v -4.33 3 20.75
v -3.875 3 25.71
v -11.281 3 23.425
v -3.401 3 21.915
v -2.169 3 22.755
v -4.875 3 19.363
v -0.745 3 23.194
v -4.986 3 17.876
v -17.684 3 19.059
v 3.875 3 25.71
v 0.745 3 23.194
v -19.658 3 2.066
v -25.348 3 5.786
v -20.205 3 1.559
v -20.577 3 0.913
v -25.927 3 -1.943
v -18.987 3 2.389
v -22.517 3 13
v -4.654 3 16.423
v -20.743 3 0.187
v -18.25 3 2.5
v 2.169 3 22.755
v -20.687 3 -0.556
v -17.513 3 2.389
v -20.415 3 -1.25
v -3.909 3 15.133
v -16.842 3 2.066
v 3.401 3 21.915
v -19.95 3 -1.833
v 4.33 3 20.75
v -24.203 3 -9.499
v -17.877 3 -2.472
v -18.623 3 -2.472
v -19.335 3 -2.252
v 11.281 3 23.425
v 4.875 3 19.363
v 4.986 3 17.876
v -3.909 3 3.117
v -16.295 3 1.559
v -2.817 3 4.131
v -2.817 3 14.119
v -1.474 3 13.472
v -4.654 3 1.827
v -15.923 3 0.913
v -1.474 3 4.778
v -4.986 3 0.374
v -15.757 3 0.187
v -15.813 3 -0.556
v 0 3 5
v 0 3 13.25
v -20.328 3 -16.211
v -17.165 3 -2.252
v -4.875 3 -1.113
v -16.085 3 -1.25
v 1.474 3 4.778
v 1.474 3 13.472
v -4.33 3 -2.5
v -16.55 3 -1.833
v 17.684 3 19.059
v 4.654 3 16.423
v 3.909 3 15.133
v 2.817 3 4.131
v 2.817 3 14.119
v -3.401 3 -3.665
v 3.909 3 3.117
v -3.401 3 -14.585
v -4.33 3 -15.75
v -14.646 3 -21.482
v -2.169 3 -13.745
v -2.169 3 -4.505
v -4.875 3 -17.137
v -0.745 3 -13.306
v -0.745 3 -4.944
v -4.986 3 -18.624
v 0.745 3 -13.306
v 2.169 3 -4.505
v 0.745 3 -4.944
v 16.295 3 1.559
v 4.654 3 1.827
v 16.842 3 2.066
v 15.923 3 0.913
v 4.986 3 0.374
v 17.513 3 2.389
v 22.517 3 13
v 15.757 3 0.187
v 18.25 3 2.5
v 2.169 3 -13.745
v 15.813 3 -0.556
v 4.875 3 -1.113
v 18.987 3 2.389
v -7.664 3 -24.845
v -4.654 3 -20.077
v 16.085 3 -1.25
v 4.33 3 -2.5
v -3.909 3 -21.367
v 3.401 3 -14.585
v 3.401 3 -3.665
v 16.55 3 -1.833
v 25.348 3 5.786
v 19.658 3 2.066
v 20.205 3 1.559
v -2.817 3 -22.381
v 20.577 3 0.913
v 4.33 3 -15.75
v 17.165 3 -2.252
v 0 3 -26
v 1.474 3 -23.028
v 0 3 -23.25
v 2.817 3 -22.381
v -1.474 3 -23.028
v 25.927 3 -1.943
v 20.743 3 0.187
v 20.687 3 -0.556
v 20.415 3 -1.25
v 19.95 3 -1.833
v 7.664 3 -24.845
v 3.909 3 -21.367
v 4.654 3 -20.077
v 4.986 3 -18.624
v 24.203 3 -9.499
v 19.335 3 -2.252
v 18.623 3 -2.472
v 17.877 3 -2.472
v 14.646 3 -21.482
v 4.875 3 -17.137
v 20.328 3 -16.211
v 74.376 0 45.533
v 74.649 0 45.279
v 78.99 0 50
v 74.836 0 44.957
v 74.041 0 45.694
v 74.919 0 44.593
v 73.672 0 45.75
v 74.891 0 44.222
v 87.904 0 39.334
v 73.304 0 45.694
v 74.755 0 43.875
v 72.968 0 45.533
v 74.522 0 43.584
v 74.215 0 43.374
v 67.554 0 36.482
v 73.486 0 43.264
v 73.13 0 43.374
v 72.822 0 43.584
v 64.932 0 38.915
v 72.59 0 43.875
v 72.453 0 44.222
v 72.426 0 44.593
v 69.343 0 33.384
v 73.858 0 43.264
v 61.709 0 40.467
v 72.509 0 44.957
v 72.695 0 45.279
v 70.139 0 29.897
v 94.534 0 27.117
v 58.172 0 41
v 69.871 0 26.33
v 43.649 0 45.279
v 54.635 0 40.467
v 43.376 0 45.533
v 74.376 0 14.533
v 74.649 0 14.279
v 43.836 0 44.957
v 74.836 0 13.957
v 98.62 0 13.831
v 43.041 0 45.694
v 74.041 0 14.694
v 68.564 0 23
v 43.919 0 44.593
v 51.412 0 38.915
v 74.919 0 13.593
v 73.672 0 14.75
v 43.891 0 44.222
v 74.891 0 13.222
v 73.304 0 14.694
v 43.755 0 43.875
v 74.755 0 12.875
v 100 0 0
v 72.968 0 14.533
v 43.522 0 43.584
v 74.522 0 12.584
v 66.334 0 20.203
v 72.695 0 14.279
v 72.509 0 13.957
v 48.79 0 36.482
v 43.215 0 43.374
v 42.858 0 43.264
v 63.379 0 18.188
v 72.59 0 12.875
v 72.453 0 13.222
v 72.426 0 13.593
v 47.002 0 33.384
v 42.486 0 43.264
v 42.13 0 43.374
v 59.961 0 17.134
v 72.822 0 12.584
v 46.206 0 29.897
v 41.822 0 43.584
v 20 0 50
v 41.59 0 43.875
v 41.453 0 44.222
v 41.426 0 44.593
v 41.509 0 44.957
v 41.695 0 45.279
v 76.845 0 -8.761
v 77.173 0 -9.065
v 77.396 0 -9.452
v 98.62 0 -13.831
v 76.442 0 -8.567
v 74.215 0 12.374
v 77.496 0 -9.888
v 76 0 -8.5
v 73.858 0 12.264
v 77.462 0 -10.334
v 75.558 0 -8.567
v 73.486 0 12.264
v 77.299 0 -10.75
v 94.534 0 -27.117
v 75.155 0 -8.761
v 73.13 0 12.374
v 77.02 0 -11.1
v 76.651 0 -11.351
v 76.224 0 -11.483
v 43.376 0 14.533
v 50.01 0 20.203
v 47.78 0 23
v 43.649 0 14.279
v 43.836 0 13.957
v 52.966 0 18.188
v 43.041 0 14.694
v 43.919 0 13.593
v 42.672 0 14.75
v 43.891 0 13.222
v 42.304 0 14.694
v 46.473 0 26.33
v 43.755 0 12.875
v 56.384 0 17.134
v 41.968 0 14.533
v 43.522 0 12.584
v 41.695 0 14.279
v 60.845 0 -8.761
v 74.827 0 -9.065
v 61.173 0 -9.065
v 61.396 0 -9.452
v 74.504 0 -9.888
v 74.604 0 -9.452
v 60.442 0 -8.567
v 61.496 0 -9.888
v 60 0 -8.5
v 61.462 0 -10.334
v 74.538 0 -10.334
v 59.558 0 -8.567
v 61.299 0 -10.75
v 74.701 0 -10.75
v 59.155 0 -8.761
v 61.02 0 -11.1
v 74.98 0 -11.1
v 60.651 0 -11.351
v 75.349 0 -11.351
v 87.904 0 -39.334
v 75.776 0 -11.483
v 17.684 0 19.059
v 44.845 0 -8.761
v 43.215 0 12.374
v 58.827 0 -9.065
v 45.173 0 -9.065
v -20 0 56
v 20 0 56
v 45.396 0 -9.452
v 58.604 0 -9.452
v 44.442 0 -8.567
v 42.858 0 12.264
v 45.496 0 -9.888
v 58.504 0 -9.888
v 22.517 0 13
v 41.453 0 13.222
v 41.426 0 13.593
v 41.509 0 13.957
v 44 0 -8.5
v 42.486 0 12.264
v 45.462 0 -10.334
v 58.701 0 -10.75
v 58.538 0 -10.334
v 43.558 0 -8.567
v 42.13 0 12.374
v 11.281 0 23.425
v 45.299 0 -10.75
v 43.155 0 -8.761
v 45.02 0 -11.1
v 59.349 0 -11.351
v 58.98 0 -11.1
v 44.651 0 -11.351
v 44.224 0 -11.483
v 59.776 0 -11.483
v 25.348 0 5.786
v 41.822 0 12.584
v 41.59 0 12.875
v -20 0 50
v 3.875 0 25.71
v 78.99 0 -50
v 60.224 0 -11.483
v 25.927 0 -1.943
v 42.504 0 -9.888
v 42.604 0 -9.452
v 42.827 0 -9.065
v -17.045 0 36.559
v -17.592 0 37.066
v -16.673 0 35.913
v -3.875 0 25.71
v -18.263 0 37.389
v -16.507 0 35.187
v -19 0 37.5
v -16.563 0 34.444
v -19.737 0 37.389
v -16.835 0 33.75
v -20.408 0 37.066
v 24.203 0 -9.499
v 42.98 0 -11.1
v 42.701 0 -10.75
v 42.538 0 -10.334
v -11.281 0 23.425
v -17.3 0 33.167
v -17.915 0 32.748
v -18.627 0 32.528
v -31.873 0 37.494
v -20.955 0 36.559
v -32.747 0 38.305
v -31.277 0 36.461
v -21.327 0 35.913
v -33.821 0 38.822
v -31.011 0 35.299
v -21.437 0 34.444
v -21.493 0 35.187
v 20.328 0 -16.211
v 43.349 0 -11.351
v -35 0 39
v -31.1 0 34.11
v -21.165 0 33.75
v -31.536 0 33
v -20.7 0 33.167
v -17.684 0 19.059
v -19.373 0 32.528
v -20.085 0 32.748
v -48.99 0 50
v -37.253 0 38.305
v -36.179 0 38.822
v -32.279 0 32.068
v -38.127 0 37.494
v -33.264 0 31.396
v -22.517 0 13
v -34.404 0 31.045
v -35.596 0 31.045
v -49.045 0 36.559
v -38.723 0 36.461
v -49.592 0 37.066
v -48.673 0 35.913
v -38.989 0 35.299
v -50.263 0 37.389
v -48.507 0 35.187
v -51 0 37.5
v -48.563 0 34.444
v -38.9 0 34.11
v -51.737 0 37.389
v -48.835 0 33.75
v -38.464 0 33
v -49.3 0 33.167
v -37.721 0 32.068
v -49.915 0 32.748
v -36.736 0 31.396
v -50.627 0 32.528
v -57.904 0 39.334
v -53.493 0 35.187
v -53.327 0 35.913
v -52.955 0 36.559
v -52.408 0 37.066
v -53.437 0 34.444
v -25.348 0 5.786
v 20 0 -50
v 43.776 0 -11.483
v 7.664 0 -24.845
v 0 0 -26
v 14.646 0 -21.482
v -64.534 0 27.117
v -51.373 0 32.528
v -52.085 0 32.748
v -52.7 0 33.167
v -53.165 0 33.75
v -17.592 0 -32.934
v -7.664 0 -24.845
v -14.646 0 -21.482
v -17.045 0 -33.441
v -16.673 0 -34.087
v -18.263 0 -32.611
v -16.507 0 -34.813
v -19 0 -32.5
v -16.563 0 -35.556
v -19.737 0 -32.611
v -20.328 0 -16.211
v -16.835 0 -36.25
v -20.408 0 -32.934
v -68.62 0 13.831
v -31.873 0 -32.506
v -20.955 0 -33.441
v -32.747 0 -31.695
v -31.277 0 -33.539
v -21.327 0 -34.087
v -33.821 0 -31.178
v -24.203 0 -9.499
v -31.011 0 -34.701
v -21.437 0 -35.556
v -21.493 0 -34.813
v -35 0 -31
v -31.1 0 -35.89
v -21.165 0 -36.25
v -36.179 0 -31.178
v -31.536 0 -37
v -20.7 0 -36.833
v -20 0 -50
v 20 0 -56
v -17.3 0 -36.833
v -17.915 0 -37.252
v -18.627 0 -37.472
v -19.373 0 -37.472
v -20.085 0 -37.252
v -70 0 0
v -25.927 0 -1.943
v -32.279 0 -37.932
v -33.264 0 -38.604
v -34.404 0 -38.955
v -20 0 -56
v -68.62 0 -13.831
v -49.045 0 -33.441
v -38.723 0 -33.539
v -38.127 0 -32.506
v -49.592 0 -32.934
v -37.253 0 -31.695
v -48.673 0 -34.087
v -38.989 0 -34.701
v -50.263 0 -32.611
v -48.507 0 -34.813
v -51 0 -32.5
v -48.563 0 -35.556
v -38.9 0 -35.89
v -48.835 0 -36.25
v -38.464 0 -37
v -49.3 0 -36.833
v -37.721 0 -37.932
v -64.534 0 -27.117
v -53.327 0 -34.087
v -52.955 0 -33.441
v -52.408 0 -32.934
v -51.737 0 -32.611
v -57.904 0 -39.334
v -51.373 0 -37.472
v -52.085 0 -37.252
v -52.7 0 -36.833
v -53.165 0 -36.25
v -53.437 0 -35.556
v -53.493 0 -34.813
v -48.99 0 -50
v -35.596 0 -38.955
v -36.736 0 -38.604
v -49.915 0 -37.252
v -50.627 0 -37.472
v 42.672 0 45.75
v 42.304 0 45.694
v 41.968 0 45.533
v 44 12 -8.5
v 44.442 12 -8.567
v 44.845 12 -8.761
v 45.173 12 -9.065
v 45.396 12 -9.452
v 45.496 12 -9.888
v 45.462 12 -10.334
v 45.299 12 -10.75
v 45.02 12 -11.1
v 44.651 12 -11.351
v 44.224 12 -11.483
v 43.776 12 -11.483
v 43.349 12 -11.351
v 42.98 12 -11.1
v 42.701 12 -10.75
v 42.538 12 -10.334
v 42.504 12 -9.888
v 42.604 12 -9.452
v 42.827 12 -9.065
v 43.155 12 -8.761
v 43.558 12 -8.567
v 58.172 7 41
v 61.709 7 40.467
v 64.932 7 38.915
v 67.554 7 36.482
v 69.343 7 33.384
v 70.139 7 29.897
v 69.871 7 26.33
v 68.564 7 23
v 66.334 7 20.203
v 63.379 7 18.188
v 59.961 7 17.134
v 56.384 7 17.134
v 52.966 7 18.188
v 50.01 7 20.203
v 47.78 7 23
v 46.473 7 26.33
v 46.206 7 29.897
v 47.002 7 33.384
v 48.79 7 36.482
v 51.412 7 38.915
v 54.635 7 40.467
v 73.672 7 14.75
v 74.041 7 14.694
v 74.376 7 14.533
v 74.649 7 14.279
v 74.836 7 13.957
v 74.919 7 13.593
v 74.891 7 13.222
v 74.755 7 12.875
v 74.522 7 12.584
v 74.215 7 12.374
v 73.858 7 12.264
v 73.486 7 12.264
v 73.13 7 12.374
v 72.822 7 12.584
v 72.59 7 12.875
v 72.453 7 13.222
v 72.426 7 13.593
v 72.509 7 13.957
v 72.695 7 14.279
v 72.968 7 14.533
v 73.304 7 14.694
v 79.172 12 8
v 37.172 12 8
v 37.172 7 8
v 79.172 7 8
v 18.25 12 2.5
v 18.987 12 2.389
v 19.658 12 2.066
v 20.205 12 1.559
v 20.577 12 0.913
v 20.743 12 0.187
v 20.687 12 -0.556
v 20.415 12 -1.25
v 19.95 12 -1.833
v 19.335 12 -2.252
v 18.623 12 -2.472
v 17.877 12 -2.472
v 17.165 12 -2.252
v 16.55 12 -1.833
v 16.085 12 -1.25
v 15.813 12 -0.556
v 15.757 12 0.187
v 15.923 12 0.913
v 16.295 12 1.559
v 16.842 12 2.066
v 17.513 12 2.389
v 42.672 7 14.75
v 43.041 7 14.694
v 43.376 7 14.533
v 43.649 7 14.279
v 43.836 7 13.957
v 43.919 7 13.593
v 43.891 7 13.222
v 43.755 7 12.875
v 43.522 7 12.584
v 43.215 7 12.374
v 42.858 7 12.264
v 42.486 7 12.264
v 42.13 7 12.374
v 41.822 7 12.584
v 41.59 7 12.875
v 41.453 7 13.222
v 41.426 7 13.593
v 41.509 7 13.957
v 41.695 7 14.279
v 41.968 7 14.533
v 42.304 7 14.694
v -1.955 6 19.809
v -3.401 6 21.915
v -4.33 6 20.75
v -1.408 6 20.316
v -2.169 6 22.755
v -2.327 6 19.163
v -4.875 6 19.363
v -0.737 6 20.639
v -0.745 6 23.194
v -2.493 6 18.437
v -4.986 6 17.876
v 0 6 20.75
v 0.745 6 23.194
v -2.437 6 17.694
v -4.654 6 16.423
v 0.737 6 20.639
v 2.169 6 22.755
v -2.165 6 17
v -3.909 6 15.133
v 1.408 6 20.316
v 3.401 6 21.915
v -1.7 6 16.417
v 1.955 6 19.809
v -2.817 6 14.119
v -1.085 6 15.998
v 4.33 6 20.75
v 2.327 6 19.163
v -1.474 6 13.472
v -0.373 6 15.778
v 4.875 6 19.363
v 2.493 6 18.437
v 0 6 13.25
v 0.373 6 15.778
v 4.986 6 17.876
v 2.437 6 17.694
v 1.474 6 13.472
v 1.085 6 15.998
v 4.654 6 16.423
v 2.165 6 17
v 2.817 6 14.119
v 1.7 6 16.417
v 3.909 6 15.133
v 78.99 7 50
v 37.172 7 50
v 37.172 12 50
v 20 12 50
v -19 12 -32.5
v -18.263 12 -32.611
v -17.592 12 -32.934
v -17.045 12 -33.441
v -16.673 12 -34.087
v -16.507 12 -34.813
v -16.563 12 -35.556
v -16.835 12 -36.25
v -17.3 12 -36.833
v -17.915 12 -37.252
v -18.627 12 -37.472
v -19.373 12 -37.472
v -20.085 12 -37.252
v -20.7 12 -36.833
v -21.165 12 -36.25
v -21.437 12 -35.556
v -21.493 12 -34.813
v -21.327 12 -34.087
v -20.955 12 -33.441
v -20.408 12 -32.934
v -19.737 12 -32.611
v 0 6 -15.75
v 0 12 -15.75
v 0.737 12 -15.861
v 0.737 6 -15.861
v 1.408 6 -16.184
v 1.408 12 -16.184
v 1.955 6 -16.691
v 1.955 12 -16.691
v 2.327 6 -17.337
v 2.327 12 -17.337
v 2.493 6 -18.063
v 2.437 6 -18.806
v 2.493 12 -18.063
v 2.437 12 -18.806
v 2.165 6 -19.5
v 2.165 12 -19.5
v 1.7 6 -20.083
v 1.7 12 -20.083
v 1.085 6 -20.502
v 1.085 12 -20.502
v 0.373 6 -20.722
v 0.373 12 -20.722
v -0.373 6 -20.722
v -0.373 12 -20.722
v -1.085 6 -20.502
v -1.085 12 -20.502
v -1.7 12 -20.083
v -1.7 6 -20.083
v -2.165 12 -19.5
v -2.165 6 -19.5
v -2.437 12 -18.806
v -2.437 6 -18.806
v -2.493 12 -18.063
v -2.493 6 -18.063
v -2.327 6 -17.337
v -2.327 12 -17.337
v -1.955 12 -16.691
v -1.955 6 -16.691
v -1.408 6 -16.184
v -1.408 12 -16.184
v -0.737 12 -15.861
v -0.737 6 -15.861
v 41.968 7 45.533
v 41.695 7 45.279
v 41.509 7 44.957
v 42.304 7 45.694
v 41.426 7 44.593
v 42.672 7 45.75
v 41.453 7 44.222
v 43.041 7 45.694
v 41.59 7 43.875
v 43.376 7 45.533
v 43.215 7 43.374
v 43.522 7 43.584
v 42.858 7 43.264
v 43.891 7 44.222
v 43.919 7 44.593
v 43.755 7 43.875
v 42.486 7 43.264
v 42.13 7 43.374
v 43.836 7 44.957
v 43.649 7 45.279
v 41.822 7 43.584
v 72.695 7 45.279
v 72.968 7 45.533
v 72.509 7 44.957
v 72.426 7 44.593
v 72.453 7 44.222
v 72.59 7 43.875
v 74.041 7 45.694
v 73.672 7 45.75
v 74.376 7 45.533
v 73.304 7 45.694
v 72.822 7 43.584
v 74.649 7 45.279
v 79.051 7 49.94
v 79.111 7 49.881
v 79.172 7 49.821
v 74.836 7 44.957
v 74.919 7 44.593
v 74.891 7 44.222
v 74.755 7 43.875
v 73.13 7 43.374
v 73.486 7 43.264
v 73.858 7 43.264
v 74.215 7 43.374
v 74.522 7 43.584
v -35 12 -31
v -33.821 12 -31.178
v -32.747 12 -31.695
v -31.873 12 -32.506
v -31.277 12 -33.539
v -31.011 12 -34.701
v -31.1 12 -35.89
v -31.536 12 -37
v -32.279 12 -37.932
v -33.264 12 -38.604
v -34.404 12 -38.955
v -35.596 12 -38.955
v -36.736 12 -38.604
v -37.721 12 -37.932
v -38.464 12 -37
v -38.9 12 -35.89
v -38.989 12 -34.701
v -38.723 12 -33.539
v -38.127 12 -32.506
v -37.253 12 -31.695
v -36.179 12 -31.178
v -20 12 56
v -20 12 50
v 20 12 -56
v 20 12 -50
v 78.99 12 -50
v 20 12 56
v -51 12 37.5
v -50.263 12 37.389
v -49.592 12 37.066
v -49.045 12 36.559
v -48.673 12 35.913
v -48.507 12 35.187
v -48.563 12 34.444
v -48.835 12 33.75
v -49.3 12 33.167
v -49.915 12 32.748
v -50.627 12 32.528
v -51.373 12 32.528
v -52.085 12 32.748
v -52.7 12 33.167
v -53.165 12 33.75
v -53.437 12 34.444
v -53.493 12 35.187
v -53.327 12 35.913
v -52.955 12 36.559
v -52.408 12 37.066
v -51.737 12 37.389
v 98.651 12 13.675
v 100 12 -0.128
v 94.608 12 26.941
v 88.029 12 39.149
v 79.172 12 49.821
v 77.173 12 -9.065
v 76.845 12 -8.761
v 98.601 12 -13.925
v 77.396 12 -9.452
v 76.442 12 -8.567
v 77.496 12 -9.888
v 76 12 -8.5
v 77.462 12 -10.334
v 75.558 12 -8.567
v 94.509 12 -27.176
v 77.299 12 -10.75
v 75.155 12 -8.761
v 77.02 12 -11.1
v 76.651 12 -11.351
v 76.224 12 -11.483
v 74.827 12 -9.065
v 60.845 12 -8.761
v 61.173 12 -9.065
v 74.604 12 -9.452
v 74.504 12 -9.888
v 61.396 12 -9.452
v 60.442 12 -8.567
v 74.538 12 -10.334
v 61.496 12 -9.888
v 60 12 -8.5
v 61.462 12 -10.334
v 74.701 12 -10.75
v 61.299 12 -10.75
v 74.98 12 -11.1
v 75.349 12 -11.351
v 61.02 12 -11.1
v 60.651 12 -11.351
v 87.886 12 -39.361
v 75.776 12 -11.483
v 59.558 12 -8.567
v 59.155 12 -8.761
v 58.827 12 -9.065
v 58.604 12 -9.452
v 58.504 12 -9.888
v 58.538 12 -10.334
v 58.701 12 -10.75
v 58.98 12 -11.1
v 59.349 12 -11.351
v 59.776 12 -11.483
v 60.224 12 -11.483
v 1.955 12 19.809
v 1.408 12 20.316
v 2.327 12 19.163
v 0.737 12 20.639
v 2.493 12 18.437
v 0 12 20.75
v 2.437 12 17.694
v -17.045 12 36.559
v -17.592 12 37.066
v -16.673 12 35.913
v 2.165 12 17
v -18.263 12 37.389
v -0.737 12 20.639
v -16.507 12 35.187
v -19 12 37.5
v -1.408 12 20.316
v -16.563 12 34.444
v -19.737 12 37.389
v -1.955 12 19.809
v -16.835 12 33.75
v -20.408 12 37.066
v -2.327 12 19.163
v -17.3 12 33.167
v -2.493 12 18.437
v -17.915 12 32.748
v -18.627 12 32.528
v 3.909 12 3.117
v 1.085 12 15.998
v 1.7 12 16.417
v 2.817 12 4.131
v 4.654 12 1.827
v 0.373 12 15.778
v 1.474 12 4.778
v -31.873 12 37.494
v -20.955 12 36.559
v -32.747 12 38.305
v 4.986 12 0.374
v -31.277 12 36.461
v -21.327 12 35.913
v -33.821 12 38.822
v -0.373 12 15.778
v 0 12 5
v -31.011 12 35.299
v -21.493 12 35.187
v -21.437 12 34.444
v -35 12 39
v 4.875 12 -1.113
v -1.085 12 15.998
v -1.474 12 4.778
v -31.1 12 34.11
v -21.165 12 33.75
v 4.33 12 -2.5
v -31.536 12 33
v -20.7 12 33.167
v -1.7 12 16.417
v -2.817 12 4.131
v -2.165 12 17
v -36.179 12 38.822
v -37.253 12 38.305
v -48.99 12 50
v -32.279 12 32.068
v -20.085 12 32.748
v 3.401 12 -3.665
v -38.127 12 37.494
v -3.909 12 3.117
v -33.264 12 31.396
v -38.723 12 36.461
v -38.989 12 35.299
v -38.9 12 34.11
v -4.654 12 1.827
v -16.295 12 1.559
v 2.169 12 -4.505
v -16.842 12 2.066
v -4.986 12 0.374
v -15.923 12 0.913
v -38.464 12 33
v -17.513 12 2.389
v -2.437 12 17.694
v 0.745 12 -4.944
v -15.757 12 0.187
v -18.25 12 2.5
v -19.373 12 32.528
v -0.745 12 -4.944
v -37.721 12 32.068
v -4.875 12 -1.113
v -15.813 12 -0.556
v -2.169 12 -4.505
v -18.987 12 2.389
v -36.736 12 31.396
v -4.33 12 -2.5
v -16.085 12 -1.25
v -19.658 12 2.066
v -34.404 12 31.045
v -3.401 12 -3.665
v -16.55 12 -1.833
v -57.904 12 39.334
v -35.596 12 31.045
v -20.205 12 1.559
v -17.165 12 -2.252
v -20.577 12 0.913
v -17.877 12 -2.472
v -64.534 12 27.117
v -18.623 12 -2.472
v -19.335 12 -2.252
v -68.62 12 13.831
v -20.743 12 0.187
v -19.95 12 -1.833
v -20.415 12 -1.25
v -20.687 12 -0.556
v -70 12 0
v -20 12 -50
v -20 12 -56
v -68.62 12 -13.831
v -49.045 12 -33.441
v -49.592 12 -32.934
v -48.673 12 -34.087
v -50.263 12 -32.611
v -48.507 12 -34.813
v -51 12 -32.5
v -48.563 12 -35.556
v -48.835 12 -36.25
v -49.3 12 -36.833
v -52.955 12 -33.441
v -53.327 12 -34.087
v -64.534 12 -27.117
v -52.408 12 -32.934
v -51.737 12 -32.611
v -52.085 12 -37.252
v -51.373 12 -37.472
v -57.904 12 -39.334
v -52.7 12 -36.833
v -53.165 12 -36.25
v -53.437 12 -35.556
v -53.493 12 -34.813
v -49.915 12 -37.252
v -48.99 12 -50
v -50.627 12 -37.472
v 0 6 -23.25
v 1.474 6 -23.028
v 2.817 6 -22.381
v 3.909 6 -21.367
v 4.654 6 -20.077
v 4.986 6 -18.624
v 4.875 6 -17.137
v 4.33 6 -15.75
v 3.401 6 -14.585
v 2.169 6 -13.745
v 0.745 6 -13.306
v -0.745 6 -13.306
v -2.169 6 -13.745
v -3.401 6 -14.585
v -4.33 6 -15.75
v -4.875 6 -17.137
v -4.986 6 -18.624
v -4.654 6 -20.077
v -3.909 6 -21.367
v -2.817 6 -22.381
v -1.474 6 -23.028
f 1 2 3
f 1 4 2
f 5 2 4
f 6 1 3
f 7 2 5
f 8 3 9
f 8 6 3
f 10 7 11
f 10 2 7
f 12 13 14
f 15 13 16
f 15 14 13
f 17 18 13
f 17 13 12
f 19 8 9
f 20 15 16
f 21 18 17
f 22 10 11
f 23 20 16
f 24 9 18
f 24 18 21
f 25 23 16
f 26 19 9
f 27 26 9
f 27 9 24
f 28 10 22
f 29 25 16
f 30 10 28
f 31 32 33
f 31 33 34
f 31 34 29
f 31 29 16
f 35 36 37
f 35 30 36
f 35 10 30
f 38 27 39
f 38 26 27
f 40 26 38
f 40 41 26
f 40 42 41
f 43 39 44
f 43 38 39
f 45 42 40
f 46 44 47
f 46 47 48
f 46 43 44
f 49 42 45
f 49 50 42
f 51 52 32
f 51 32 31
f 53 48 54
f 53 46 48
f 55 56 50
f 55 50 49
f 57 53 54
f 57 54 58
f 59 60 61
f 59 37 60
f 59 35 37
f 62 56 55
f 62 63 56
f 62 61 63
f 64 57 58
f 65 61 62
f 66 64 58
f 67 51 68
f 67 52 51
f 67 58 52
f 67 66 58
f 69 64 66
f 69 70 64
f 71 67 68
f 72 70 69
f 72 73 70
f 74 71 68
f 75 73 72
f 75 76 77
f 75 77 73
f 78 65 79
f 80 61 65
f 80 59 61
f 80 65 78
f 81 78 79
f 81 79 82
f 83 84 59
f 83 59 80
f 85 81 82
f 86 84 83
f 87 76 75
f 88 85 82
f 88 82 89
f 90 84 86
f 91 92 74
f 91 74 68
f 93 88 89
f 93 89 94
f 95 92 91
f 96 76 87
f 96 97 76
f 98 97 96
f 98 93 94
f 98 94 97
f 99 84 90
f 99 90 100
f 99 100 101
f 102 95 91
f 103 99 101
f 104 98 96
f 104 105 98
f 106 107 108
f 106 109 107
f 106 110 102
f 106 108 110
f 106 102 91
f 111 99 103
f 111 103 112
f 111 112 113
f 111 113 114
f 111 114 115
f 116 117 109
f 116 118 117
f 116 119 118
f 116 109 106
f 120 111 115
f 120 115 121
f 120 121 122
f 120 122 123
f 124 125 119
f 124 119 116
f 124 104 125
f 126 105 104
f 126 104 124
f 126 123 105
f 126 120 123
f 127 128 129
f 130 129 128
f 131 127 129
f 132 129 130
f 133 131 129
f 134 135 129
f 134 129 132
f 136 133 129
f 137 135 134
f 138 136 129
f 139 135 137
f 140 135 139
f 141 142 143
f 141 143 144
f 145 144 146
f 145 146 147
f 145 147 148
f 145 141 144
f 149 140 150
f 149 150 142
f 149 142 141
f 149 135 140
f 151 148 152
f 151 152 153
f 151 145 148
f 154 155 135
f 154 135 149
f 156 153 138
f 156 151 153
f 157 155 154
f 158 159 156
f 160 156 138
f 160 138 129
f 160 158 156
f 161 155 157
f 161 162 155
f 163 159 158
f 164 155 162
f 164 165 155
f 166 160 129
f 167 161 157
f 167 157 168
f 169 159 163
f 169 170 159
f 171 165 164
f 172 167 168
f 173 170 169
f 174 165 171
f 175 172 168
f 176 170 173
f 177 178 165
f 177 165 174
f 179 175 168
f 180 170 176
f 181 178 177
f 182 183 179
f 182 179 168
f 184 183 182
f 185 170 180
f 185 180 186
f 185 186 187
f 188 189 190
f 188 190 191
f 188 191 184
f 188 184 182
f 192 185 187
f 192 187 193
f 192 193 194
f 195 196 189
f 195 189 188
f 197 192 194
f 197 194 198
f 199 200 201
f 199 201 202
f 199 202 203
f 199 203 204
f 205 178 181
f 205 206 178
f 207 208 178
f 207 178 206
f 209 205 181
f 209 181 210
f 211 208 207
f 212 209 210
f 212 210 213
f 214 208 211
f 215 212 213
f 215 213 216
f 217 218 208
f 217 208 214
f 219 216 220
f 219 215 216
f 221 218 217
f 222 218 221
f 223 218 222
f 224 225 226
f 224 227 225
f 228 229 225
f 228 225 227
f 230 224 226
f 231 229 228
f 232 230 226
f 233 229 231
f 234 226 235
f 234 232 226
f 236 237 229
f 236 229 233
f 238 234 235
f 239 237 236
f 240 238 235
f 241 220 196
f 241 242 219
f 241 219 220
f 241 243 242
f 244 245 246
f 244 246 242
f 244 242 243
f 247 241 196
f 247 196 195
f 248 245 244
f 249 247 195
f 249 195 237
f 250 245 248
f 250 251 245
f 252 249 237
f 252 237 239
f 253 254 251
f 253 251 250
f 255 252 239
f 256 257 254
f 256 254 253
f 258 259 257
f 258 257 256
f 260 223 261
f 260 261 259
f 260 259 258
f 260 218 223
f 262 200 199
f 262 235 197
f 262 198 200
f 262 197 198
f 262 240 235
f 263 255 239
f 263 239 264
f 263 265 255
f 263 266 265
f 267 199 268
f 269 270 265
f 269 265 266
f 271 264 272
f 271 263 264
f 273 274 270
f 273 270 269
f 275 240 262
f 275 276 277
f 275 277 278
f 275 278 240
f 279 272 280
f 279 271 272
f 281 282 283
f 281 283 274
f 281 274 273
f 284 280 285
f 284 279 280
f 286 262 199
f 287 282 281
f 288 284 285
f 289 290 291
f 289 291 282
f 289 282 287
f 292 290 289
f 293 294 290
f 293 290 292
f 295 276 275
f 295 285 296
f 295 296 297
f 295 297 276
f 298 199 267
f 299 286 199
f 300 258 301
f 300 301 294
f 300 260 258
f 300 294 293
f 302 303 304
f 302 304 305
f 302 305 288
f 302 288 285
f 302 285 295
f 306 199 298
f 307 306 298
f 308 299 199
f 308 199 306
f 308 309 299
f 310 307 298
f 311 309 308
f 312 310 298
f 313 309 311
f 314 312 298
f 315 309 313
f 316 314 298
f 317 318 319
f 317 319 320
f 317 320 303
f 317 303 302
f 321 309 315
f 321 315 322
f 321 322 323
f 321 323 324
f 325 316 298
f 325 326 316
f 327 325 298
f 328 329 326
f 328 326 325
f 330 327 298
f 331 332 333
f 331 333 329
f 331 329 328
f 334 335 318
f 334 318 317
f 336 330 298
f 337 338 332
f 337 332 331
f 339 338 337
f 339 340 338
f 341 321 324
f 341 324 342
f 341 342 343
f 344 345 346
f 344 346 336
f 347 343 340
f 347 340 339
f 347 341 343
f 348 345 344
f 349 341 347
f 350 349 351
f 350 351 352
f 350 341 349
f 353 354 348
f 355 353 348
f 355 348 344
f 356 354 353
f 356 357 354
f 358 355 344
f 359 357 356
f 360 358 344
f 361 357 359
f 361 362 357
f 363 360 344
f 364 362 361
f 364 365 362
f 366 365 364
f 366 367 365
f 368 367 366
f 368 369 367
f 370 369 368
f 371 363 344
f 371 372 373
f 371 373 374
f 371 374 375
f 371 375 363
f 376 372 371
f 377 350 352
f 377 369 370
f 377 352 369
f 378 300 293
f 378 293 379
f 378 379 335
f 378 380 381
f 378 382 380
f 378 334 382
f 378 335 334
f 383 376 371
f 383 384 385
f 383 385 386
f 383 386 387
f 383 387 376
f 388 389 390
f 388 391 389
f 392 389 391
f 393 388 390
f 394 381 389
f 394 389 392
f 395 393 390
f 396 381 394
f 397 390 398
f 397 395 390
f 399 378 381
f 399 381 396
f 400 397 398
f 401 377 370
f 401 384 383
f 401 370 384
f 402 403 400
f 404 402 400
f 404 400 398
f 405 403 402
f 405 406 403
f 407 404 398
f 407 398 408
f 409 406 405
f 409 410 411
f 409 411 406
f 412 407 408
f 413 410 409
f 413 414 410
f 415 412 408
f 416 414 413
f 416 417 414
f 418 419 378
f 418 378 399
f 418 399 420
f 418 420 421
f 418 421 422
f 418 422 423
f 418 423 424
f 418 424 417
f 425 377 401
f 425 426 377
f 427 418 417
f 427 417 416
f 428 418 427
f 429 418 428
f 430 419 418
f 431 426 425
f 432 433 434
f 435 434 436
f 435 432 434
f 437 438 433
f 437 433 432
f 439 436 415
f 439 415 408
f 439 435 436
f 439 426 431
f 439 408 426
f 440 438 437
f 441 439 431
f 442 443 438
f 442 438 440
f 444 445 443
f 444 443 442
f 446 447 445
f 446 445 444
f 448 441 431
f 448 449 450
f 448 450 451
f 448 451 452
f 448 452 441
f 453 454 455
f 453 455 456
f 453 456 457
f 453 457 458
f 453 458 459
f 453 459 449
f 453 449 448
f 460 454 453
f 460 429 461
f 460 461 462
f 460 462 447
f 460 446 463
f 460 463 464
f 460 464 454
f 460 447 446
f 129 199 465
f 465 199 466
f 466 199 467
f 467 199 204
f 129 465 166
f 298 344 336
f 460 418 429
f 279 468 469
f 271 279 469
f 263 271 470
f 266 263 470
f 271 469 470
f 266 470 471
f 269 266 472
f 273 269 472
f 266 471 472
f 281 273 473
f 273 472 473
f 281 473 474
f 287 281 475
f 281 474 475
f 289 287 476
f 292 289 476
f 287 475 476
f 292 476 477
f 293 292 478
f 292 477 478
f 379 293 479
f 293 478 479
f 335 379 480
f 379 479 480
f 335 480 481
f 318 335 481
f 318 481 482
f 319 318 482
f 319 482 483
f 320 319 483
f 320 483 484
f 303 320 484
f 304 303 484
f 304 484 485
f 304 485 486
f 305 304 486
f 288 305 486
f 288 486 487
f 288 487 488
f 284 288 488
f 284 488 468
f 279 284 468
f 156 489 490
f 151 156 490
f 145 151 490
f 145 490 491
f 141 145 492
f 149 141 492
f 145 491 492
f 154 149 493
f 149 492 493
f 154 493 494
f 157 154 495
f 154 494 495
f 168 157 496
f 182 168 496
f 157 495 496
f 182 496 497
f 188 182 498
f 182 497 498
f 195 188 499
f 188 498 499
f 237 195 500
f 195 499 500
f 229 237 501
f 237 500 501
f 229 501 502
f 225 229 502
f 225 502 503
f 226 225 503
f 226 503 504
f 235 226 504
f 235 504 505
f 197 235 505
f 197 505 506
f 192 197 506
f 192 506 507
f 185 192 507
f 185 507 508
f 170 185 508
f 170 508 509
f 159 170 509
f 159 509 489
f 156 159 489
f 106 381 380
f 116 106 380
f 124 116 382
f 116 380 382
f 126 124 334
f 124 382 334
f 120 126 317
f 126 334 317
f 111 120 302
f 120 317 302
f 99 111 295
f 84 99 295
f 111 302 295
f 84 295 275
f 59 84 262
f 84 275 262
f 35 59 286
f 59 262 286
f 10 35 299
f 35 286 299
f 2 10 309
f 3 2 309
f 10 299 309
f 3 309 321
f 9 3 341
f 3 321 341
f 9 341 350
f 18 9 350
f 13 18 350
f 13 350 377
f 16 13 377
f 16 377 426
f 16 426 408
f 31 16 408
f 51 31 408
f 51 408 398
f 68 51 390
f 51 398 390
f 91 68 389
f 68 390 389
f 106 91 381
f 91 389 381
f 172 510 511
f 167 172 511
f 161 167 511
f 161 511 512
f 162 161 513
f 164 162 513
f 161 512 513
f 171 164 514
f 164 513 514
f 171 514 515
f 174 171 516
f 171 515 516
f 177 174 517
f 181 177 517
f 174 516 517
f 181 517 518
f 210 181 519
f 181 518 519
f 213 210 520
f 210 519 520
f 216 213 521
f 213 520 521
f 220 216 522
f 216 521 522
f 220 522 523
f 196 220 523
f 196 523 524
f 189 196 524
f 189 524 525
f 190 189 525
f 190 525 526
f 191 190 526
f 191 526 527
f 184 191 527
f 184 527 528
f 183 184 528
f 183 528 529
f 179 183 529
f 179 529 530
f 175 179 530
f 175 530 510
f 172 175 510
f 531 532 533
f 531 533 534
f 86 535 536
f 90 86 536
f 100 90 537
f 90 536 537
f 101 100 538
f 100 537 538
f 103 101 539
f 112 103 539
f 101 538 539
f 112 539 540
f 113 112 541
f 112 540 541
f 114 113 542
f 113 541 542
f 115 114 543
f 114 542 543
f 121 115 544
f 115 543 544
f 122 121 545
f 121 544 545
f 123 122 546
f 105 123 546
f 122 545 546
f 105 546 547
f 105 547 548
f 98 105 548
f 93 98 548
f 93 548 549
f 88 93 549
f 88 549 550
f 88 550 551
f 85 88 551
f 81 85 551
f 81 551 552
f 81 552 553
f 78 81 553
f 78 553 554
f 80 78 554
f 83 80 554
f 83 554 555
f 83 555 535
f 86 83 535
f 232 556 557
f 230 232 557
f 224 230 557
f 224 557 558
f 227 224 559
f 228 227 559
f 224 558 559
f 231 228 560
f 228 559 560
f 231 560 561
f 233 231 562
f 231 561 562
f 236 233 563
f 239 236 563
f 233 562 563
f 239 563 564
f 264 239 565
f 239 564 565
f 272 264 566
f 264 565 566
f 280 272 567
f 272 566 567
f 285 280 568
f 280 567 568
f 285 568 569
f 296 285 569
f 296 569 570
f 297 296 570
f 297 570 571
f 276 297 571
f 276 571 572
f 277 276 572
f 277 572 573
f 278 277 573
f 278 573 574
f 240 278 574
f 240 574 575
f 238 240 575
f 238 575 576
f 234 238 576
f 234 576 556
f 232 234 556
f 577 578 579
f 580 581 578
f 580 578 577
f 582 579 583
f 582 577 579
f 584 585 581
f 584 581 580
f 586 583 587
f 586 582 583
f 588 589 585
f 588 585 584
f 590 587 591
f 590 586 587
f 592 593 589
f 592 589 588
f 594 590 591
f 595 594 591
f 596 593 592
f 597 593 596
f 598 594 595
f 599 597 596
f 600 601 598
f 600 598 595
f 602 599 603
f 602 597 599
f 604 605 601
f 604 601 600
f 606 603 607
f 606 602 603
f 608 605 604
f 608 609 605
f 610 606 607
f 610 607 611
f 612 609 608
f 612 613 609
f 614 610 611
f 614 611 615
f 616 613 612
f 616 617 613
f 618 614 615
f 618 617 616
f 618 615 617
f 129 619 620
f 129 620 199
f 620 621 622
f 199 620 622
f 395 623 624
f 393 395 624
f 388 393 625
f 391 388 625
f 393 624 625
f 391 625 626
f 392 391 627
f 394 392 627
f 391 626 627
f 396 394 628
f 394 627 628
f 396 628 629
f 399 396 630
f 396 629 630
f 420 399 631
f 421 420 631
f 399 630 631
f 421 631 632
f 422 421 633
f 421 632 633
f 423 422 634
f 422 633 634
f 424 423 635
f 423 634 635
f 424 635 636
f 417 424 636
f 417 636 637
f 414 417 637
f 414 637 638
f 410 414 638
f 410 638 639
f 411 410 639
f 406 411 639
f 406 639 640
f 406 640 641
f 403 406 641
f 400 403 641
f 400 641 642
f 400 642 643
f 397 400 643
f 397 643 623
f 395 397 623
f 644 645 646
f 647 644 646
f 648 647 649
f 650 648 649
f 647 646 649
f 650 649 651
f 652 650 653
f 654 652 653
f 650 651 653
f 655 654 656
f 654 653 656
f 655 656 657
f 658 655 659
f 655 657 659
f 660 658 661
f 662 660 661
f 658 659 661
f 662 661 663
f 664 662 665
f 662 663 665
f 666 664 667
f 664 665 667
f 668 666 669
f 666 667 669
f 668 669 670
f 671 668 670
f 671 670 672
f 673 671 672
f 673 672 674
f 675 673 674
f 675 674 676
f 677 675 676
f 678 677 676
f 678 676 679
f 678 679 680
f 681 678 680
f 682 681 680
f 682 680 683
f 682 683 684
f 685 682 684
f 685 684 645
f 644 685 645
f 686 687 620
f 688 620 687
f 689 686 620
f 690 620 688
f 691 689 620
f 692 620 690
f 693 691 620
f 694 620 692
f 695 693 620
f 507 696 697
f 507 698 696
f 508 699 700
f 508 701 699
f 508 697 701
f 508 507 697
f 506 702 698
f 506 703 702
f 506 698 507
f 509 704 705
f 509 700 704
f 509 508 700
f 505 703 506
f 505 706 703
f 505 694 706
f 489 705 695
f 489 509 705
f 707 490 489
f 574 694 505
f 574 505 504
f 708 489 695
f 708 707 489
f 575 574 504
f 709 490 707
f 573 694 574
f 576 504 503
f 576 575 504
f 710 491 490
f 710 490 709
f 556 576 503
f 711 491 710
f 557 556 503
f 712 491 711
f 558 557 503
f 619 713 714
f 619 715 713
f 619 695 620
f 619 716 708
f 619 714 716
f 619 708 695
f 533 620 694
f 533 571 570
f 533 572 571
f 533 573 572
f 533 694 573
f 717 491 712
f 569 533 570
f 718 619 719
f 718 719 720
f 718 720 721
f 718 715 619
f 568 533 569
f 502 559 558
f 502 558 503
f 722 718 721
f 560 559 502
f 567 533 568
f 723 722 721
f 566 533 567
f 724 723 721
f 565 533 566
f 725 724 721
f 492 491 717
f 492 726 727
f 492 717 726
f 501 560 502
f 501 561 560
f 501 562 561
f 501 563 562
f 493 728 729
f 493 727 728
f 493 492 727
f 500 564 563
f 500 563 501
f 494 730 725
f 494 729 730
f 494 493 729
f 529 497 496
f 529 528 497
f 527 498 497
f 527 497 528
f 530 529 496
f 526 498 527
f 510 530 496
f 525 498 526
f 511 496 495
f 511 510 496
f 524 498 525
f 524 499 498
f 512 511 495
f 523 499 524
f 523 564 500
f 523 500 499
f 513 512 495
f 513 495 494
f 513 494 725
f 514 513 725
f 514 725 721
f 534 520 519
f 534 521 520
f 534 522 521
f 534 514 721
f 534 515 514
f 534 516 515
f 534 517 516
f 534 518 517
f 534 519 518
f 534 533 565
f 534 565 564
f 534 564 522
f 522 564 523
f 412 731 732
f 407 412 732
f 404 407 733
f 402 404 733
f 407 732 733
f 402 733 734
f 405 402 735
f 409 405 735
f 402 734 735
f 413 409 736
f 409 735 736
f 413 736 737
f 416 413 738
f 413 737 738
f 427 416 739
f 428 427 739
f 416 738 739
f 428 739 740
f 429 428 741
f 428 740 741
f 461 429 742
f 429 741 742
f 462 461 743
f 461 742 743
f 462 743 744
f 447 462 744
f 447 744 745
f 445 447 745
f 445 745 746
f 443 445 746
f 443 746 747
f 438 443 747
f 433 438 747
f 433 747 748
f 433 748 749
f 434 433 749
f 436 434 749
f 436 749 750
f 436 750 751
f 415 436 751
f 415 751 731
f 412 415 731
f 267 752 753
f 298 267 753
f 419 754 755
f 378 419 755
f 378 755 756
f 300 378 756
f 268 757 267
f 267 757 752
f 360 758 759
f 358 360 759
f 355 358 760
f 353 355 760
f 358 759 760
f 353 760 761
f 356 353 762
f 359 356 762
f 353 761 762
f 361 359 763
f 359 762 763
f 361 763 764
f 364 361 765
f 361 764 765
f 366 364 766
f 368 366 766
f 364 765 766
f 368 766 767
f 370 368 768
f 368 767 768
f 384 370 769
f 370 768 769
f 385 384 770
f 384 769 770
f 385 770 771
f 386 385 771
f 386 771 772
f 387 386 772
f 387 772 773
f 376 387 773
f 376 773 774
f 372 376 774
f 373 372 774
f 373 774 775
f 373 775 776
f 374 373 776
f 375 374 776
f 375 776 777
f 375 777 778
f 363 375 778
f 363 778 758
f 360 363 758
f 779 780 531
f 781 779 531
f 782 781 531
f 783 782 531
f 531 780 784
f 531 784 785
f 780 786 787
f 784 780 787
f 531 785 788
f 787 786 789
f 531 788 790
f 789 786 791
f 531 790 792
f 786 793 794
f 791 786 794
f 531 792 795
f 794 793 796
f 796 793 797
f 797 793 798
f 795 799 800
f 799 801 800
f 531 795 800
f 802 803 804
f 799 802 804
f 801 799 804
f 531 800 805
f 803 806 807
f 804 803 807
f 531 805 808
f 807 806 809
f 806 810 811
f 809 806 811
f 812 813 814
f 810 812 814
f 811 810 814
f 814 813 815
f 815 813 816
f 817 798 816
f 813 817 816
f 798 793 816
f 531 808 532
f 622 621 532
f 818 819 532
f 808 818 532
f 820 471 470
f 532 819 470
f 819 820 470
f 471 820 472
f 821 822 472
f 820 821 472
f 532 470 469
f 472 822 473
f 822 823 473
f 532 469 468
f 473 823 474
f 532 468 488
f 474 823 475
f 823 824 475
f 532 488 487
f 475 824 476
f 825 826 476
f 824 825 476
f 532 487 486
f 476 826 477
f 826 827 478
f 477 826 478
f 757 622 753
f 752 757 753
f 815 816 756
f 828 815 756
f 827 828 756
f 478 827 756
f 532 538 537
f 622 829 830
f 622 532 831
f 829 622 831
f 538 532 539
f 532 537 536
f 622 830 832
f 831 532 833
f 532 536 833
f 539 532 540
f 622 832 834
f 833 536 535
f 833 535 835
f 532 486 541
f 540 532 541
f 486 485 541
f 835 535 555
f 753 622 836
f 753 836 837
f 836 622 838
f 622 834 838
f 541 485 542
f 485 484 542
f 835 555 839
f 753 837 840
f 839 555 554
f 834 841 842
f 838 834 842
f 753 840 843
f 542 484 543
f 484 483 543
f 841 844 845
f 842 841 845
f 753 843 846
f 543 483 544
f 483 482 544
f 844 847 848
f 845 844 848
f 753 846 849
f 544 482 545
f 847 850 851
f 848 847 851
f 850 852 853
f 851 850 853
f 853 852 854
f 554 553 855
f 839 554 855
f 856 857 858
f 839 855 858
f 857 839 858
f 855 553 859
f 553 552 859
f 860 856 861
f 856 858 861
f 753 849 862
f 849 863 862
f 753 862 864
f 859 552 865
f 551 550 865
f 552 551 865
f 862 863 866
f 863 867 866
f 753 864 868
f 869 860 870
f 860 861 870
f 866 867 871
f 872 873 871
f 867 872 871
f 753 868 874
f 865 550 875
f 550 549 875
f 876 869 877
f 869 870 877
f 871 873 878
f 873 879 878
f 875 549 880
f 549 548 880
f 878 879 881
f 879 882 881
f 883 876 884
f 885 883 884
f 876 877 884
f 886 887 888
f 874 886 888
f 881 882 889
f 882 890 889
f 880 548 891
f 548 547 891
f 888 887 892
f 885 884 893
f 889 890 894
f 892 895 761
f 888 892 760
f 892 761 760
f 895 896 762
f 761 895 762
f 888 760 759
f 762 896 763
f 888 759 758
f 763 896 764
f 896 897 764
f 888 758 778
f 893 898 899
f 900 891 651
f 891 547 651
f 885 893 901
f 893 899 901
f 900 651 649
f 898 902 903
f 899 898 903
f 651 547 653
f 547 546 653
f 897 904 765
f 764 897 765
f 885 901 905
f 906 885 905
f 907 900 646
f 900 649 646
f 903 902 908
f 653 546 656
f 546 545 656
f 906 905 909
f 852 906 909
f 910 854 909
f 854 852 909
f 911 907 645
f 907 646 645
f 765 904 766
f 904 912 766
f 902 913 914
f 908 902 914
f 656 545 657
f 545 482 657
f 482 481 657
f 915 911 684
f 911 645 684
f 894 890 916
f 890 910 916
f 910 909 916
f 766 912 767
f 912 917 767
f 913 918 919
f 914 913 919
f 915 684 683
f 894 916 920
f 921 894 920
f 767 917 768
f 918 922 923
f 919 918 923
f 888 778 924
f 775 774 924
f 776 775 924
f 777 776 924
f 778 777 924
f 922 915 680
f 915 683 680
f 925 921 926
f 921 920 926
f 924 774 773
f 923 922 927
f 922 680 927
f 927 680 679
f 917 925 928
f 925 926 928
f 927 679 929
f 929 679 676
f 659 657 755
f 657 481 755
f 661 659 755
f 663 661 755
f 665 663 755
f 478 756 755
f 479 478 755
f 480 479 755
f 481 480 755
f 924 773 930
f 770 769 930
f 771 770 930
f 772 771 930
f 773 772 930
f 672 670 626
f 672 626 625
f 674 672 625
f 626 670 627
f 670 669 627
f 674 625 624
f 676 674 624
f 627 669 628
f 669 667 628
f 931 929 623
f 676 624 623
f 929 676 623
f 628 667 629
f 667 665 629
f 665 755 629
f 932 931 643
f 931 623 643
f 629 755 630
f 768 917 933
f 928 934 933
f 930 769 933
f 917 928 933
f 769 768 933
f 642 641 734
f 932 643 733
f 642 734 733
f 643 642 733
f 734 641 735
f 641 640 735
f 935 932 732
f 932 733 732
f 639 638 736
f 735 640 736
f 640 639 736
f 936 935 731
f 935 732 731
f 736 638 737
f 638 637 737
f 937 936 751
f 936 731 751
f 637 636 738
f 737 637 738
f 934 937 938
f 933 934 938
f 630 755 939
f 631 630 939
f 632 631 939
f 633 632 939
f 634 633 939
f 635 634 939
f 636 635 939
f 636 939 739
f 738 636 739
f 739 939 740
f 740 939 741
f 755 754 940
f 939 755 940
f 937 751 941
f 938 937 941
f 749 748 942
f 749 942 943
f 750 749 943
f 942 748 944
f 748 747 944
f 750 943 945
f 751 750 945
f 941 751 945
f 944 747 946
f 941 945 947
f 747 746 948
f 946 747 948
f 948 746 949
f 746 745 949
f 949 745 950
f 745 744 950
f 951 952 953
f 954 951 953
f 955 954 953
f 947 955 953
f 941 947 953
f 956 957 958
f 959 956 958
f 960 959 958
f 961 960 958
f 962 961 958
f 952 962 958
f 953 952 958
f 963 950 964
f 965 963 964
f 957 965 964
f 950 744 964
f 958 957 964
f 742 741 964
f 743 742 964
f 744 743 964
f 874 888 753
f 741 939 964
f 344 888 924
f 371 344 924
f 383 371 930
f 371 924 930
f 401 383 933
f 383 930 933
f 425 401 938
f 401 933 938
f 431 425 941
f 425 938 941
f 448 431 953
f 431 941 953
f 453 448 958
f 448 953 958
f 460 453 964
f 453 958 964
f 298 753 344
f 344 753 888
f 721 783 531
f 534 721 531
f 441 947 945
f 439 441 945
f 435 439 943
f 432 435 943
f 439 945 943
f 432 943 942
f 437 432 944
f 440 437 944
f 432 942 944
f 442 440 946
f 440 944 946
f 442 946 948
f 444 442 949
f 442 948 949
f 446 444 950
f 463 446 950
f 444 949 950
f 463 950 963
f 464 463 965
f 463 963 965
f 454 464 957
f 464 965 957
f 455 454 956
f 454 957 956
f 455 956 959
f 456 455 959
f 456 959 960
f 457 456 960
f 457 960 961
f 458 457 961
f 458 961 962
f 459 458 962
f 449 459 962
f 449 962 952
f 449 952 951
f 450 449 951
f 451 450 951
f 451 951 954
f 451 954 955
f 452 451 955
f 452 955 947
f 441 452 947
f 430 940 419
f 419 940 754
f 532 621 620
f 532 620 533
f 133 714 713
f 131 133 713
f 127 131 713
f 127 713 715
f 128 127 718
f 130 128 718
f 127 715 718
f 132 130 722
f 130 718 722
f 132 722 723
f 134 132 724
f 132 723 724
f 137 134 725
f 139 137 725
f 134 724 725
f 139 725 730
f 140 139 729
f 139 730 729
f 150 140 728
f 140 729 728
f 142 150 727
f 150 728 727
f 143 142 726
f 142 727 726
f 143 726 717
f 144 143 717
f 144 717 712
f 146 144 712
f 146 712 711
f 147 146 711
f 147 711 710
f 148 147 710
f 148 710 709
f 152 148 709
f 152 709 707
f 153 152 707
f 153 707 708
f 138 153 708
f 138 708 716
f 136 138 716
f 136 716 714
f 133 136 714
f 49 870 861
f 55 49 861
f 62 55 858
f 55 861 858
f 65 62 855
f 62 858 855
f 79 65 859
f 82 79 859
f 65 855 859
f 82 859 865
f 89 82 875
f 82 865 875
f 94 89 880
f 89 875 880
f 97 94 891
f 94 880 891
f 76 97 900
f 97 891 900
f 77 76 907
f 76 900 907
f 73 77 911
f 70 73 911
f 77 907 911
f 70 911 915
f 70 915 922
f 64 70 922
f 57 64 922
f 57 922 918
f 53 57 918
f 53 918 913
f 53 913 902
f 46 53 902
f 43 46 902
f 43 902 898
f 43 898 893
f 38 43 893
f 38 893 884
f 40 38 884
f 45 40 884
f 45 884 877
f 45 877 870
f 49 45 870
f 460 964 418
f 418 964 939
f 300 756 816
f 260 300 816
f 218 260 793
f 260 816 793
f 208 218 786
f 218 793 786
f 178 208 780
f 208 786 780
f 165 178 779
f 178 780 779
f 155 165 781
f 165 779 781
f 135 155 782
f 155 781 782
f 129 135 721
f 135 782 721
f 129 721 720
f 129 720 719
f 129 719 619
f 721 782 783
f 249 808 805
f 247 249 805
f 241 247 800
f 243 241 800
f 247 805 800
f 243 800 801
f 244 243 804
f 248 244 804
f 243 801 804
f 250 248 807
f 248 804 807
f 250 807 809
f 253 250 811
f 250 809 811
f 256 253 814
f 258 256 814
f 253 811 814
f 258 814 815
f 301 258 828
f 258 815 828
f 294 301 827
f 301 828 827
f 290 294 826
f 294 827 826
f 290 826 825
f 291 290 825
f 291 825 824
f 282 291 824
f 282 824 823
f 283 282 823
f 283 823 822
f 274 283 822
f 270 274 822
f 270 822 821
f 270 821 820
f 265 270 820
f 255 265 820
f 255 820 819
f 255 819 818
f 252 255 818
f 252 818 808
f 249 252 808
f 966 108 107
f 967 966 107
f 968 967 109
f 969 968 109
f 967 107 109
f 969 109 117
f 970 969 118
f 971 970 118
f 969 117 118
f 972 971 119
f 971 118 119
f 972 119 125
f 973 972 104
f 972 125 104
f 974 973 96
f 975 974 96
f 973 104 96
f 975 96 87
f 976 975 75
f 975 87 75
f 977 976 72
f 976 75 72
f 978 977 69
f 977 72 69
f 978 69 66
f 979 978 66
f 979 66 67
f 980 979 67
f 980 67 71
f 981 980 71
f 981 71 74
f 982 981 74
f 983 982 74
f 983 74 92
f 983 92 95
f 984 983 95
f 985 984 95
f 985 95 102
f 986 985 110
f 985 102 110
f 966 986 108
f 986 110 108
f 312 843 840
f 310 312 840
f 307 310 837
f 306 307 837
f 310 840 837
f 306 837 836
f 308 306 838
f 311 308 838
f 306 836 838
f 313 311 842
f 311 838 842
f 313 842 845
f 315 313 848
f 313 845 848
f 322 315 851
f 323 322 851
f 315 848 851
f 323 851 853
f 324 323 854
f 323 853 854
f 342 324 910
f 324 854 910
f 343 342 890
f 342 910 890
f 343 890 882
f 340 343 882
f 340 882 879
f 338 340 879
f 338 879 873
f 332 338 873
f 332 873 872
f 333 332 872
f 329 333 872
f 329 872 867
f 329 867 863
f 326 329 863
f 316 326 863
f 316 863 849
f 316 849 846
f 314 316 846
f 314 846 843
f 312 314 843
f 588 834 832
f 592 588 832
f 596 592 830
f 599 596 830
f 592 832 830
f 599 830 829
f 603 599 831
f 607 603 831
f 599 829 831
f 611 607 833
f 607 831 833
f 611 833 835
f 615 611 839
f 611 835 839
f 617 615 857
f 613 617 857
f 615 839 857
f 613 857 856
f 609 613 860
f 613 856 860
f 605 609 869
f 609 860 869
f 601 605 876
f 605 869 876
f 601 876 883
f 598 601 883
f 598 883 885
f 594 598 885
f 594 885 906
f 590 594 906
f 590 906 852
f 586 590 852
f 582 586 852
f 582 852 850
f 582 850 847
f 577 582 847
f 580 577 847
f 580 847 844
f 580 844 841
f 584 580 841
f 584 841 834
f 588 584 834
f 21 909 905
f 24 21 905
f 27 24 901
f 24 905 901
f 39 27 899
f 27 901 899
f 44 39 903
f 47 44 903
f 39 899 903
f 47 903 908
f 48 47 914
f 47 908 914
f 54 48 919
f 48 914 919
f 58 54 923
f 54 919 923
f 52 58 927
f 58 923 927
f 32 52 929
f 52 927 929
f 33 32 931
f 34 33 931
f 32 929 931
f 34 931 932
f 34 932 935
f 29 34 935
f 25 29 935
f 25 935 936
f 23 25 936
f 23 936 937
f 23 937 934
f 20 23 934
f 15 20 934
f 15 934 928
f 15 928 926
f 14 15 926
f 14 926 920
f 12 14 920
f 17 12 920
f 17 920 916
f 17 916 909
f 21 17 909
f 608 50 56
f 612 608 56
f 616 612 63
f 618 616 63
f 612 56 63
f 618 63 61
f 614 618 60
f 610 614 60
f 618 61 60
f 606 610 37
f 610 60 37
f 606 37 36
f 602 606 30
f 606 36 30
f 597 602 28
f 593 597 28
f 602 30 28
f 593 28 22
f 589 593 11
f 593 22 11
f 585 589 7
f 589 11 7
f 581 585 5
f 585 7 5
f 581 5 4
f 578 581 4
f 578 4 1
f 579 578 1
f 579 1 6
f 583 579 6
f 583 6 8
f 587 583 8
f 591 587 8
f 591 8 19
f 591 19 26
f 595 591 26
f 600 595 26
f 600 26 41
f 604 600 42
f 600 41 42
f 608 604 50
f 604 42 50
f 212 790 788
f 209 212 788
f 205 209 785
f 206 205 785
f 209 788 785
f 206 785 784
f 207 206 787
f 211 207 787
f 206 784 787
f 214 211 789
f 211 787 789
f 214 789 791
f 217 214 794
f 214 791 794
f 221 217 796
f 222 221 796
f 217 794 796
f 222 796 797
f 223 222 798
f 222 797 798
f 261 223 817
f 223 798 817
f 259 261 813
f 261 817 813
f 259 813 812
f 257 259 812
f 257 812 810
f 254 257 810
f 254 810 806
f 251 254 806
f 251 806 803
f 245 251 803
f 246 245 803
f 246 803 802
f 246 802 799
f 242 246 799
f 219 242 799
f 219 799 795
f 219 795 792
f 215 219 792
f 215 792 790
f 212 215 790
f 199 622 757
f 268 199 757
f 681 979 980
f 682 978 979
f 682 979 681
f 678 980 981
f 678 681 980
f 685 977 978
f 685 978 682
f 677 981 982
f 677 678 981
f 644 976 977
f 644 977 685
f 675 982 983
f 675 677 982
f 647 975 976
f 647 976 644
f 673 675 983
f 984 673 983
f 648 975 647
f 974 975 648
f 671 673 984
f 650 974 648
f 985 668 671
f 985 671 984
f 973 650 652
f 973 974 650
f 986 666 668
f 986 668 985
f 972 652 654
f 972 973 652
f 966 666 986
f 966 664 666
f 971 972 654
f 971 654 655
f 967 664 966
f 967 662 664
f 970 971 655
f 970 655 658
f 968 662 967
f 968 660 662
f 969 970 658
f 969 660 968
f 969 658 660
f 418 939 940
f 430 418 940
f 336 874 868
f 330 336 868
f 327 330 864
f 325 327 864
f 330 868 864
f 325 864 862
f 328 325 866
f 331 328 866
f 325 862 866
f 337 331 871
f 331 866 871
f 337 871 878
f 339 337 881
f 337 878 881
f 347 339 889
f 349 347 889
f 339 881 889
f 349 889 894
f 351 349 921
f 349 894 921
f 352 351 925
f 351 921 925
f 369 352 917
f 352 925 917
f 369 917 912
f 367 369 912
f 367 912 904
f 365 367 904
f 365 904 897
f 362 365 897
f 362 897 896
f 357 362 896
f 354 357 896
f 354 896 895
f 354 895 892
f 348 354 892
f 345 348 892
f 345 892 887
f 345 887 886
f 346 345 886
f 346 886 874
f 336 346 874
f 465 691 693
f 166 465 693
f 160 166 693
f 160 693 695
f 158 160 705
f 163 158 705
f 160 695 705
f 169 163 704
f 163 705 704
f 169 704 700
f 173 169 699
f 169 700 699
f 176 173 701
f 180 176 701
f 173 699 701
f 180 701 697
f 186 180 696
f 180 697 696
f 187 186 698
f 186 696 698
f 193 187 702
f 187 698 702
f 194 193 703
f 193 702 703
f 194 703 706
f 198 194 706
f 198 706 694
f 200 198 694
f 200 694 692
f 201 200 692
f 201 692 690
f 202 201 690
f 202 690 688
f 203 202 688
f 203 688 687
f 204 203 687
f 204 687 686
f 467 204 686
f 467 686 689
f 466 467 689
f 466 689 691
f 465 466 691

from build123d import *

# Parameters (mm, degrees)
SKETCH1_W           = 150
SKETCH1_H           = 150
BOSS_EXTRUDE1_DEPTH = 12
SKETCH8_W           = 200
SKETCH8_H           = 200
CUT_EXTRUDE7_DEPTH  = 15
BOSS_EXTRUDE2_DEPTH = 12
SKETCH6_W           = 42
SKETCH6_H           = 42
CUT_EXTRUDE5_DEPTH  = 5
SKETCH9_R           = 4
SKETCH9_R_2         = 2.5
CUT_EXTRUDE8_DEPTH  = 15
SKETCH10_R          = 12
SKETCH10_R_2        = 1.25
CUT_EXTRUDE9_DEPTH  = 10
SKETCH12_R          = 2.5
SKETCH12_R_2        = 5
SKETCH12_R_3        = 1.5
CUT_EXTRUDE10_DEPTH = 20
SKETCH16_R          = 26
CUT_EXTRUDE11_DEPTH = 3
SKETCH17_R          = 5
CUT_EXTRUDE12_DEPTH = 3


with BuildPart() as part:
    # Sketch1 → Boss-Extrude1 (new body)
    with BuildSketch(Plane(origin=(0, 0, 0), x_dir=(1, 0, 0), z_dir=(0, 1, 0))):
        Rectangle(SKETCH1_W, SKETCH1_H)
    extrude(amount=BOSS_EXTRUDE1_DEPTH)

    # Sketch8 → Cut-Extrude7 (cut)
    with BuildSketch(Plane(origin=(0, 12, 0), x_dir=(1, 0, 0), z_dir=(0, 1, 0))):
        Rectangle(SKETCH8_W, SKETCH8_H)
        with BuildLine():
            Line((-48.989794856, 50), (-20, 50))
            Line((-20, 50), (-20, 56))
            Line((-20, 56), (20, 56))
            Line((20, 56), (20, 50))
            Line((20, 50), (48.989794856, 50))
            ThreePointArc((48.989794856, 50), (70, 0), (48.989794856, -50))
            Line((48.989794856, -50), (20, -50))
            Line((20, -50), (20, -56))
            Line((20, -56), (-20, -56))
            Line((-20, -56), (-20, -50))
            Line((-20, -50), (-48.989794856, -50))
            ThreePointArc((-48.989794856, -50), (-70, 0), (-48.989794856, 50))
        make_face(mode=Mode.SUBTRACT)
    extrude(amount=-CUT_EXTRUDE7_DEPTH, mode=Mode.SUBTRACT)

    # Sketch11 → Boss-Extrude2 (add)
    with BuildSketch(Plane(origin=(0, 12, 0), x_dir=(1, 0, 0), z_dir=(0, 1, 0))):
        with BuildLine():
            Line((48.989794856, 50), (78.989794856, 50))
            ThreePointArc((78.989794856, 50), (100, 0), (78.989794856, -50))
            Line((78.989794856, -50), (48.989794856, -50))
            ThreePointArc((48.989794856, -50), (70, 0), (48.989794856, 50))
        make_face()
    extrude(amount=-BOSS_EXTRUDE2_DEPTH)

    # Sketch6 → Cut-Extrude5 (cut)
    with BuildSketch(Plane(origin=(0, 12, 0), x_dir=(1, 0, 0), z_dir=(0, 1, 0))):
        with Locations((58.172158289, -29)):
            Rectangle(SKETCH6_W, SKETCH6_H)
    extrude(amount=-CUT_EXTRUDE5_DEPTH, mode=Mode.SUBTRACT)

    # Sketch9 → Cut-Extrude8 (cut)
    with BuildSketch(Plane(origin=(0, 12, 0), x_dir=(1, 0, 0), z_dir=(0, 1, 0))):
        with Locations(Location((-35, 35, 0), (0, 0, 270))):
            Circle(SKETCH9_R)
        with Locations(Location((-35, -35, 0), (0, 0, 270))):
            Circle(SKETCH9_R)
        with Locations(Location((-19, 35, 0), (0, 0, 270))):
            Circle(SKETCH9_R_2)
        with Locations(Location((-51, 35, 0), (0, 0, 270))):
            Circle(SKETCH9_R_2)
        with Locations(Location((-19, -35, 0), (0, 0, 270))):
            Circle(SKETCH9_R_2)
        with Locations(Location((-51, -35, 0), (0, 0, 270))):
            Circle(SKETCH9_R_2)
    extrude(amount=-CUT_EXTRUDE8_DEPTH, mode=Mode.SUBTRACT)

    # Sketch10 → Cut-Extrude9 (cut)
    with BuildSketch(Plane(origin=(0, 7, 0), x_dir=(1, 0, 0), z_dir=(0, 1, 0))):
        with Locations(Location((58.172158289, -29, 0), (0, 0, 270))):
            Circle(SKETCH10_R)
        with Locations(Location((42.672158289, -13.5, 0), (0, 0, 270))):
            Circle(SKETCH10_R_2)
        with Locations(Location((73.672158289, -13.5, 0), (0, 0, 270))):
            Circle(SKETCH10_R_2)
        with Locations(Location((42.672158289, -44.5, 0), (0, 0, 270))):
            Circle(SKETCH10_R_2)
        with Locations(Location((73.672158289, -44.5, 0), (0, 0, 270))):
            Circle(SKETCH10_R_2)
    extrude(amount=-CUT_EXTRUDE9_DEPTH, mode=Mode.SUBTRACT)

    # Sketch12 → Cut-Extrude10 (cut)
    with BuildSketch(Plane(origin=(0, 12, 0), x_dir=(1, 0, 0), z_dir=(0, 1, 0))):
        with Locations(Location((0, 18.25, 0), (0, 0, 270))):
            Circle(SKETCH12_R)
        with Locations(Location((0, -18.25, 0), (0, 0, 270))):
            Circle(SKETCH12_R)
        with Locations(Location((0, 0, 0), (0, 0, 270))):
            Circle(SKETCH12_R_2)
        with Locations(Location((18.25, 0, 0), (0, 0, 270))):
            Circle(SKETCH12_R)
        with Locations(Location((-18.25, 0, 0), (0, 0, 270))):
            Circle(SKETCH12_R)
        with Locations(Location((76, 10, 0), (0, 0, 270))):
            Circle(SKETCH12_R_3)
        with Locations(Location((60, 10, 0), (0, 0, 270))):
            Circle(SKETCH12_R_3)
        with Locations(Location((44, 10, 0), (0, 0, 270))):
            Circle(SKETCH12_R_3)
    extrude(amount=-CUT_EXTRUDE10_DEPTH, mode=Mode.SUBTRACT)

    # Sketch16 → Cut-Extrude11 (cut)
    with BuildSketch(Plane.XZ):
        with Locations(Location((0, 0, 0), (0, 0, 270))):
            Circle(SKETCH16_R)
    extrude(amount=-CUT_EXTRUDE11_DEPTH, mode=Mode.SUBTRACT)

    # Sketch17 → Cut-Extrude12 (cut)
    with BuildSketch(Plane.XZ.offset(-3)):
        with Locations(Location((0, 18.25, 0), (0, 0, 270))):
            Circle(SKETCH17_R)
        with Locations(Location((0, -18.25, 0), (0, 0, 270))):
            Circle(SKETCH17_R)
    extrude(amount=-CUT_EXTRUDE12_DEPTH, mode=Mode.SUBTRACT)


solid = part.part
